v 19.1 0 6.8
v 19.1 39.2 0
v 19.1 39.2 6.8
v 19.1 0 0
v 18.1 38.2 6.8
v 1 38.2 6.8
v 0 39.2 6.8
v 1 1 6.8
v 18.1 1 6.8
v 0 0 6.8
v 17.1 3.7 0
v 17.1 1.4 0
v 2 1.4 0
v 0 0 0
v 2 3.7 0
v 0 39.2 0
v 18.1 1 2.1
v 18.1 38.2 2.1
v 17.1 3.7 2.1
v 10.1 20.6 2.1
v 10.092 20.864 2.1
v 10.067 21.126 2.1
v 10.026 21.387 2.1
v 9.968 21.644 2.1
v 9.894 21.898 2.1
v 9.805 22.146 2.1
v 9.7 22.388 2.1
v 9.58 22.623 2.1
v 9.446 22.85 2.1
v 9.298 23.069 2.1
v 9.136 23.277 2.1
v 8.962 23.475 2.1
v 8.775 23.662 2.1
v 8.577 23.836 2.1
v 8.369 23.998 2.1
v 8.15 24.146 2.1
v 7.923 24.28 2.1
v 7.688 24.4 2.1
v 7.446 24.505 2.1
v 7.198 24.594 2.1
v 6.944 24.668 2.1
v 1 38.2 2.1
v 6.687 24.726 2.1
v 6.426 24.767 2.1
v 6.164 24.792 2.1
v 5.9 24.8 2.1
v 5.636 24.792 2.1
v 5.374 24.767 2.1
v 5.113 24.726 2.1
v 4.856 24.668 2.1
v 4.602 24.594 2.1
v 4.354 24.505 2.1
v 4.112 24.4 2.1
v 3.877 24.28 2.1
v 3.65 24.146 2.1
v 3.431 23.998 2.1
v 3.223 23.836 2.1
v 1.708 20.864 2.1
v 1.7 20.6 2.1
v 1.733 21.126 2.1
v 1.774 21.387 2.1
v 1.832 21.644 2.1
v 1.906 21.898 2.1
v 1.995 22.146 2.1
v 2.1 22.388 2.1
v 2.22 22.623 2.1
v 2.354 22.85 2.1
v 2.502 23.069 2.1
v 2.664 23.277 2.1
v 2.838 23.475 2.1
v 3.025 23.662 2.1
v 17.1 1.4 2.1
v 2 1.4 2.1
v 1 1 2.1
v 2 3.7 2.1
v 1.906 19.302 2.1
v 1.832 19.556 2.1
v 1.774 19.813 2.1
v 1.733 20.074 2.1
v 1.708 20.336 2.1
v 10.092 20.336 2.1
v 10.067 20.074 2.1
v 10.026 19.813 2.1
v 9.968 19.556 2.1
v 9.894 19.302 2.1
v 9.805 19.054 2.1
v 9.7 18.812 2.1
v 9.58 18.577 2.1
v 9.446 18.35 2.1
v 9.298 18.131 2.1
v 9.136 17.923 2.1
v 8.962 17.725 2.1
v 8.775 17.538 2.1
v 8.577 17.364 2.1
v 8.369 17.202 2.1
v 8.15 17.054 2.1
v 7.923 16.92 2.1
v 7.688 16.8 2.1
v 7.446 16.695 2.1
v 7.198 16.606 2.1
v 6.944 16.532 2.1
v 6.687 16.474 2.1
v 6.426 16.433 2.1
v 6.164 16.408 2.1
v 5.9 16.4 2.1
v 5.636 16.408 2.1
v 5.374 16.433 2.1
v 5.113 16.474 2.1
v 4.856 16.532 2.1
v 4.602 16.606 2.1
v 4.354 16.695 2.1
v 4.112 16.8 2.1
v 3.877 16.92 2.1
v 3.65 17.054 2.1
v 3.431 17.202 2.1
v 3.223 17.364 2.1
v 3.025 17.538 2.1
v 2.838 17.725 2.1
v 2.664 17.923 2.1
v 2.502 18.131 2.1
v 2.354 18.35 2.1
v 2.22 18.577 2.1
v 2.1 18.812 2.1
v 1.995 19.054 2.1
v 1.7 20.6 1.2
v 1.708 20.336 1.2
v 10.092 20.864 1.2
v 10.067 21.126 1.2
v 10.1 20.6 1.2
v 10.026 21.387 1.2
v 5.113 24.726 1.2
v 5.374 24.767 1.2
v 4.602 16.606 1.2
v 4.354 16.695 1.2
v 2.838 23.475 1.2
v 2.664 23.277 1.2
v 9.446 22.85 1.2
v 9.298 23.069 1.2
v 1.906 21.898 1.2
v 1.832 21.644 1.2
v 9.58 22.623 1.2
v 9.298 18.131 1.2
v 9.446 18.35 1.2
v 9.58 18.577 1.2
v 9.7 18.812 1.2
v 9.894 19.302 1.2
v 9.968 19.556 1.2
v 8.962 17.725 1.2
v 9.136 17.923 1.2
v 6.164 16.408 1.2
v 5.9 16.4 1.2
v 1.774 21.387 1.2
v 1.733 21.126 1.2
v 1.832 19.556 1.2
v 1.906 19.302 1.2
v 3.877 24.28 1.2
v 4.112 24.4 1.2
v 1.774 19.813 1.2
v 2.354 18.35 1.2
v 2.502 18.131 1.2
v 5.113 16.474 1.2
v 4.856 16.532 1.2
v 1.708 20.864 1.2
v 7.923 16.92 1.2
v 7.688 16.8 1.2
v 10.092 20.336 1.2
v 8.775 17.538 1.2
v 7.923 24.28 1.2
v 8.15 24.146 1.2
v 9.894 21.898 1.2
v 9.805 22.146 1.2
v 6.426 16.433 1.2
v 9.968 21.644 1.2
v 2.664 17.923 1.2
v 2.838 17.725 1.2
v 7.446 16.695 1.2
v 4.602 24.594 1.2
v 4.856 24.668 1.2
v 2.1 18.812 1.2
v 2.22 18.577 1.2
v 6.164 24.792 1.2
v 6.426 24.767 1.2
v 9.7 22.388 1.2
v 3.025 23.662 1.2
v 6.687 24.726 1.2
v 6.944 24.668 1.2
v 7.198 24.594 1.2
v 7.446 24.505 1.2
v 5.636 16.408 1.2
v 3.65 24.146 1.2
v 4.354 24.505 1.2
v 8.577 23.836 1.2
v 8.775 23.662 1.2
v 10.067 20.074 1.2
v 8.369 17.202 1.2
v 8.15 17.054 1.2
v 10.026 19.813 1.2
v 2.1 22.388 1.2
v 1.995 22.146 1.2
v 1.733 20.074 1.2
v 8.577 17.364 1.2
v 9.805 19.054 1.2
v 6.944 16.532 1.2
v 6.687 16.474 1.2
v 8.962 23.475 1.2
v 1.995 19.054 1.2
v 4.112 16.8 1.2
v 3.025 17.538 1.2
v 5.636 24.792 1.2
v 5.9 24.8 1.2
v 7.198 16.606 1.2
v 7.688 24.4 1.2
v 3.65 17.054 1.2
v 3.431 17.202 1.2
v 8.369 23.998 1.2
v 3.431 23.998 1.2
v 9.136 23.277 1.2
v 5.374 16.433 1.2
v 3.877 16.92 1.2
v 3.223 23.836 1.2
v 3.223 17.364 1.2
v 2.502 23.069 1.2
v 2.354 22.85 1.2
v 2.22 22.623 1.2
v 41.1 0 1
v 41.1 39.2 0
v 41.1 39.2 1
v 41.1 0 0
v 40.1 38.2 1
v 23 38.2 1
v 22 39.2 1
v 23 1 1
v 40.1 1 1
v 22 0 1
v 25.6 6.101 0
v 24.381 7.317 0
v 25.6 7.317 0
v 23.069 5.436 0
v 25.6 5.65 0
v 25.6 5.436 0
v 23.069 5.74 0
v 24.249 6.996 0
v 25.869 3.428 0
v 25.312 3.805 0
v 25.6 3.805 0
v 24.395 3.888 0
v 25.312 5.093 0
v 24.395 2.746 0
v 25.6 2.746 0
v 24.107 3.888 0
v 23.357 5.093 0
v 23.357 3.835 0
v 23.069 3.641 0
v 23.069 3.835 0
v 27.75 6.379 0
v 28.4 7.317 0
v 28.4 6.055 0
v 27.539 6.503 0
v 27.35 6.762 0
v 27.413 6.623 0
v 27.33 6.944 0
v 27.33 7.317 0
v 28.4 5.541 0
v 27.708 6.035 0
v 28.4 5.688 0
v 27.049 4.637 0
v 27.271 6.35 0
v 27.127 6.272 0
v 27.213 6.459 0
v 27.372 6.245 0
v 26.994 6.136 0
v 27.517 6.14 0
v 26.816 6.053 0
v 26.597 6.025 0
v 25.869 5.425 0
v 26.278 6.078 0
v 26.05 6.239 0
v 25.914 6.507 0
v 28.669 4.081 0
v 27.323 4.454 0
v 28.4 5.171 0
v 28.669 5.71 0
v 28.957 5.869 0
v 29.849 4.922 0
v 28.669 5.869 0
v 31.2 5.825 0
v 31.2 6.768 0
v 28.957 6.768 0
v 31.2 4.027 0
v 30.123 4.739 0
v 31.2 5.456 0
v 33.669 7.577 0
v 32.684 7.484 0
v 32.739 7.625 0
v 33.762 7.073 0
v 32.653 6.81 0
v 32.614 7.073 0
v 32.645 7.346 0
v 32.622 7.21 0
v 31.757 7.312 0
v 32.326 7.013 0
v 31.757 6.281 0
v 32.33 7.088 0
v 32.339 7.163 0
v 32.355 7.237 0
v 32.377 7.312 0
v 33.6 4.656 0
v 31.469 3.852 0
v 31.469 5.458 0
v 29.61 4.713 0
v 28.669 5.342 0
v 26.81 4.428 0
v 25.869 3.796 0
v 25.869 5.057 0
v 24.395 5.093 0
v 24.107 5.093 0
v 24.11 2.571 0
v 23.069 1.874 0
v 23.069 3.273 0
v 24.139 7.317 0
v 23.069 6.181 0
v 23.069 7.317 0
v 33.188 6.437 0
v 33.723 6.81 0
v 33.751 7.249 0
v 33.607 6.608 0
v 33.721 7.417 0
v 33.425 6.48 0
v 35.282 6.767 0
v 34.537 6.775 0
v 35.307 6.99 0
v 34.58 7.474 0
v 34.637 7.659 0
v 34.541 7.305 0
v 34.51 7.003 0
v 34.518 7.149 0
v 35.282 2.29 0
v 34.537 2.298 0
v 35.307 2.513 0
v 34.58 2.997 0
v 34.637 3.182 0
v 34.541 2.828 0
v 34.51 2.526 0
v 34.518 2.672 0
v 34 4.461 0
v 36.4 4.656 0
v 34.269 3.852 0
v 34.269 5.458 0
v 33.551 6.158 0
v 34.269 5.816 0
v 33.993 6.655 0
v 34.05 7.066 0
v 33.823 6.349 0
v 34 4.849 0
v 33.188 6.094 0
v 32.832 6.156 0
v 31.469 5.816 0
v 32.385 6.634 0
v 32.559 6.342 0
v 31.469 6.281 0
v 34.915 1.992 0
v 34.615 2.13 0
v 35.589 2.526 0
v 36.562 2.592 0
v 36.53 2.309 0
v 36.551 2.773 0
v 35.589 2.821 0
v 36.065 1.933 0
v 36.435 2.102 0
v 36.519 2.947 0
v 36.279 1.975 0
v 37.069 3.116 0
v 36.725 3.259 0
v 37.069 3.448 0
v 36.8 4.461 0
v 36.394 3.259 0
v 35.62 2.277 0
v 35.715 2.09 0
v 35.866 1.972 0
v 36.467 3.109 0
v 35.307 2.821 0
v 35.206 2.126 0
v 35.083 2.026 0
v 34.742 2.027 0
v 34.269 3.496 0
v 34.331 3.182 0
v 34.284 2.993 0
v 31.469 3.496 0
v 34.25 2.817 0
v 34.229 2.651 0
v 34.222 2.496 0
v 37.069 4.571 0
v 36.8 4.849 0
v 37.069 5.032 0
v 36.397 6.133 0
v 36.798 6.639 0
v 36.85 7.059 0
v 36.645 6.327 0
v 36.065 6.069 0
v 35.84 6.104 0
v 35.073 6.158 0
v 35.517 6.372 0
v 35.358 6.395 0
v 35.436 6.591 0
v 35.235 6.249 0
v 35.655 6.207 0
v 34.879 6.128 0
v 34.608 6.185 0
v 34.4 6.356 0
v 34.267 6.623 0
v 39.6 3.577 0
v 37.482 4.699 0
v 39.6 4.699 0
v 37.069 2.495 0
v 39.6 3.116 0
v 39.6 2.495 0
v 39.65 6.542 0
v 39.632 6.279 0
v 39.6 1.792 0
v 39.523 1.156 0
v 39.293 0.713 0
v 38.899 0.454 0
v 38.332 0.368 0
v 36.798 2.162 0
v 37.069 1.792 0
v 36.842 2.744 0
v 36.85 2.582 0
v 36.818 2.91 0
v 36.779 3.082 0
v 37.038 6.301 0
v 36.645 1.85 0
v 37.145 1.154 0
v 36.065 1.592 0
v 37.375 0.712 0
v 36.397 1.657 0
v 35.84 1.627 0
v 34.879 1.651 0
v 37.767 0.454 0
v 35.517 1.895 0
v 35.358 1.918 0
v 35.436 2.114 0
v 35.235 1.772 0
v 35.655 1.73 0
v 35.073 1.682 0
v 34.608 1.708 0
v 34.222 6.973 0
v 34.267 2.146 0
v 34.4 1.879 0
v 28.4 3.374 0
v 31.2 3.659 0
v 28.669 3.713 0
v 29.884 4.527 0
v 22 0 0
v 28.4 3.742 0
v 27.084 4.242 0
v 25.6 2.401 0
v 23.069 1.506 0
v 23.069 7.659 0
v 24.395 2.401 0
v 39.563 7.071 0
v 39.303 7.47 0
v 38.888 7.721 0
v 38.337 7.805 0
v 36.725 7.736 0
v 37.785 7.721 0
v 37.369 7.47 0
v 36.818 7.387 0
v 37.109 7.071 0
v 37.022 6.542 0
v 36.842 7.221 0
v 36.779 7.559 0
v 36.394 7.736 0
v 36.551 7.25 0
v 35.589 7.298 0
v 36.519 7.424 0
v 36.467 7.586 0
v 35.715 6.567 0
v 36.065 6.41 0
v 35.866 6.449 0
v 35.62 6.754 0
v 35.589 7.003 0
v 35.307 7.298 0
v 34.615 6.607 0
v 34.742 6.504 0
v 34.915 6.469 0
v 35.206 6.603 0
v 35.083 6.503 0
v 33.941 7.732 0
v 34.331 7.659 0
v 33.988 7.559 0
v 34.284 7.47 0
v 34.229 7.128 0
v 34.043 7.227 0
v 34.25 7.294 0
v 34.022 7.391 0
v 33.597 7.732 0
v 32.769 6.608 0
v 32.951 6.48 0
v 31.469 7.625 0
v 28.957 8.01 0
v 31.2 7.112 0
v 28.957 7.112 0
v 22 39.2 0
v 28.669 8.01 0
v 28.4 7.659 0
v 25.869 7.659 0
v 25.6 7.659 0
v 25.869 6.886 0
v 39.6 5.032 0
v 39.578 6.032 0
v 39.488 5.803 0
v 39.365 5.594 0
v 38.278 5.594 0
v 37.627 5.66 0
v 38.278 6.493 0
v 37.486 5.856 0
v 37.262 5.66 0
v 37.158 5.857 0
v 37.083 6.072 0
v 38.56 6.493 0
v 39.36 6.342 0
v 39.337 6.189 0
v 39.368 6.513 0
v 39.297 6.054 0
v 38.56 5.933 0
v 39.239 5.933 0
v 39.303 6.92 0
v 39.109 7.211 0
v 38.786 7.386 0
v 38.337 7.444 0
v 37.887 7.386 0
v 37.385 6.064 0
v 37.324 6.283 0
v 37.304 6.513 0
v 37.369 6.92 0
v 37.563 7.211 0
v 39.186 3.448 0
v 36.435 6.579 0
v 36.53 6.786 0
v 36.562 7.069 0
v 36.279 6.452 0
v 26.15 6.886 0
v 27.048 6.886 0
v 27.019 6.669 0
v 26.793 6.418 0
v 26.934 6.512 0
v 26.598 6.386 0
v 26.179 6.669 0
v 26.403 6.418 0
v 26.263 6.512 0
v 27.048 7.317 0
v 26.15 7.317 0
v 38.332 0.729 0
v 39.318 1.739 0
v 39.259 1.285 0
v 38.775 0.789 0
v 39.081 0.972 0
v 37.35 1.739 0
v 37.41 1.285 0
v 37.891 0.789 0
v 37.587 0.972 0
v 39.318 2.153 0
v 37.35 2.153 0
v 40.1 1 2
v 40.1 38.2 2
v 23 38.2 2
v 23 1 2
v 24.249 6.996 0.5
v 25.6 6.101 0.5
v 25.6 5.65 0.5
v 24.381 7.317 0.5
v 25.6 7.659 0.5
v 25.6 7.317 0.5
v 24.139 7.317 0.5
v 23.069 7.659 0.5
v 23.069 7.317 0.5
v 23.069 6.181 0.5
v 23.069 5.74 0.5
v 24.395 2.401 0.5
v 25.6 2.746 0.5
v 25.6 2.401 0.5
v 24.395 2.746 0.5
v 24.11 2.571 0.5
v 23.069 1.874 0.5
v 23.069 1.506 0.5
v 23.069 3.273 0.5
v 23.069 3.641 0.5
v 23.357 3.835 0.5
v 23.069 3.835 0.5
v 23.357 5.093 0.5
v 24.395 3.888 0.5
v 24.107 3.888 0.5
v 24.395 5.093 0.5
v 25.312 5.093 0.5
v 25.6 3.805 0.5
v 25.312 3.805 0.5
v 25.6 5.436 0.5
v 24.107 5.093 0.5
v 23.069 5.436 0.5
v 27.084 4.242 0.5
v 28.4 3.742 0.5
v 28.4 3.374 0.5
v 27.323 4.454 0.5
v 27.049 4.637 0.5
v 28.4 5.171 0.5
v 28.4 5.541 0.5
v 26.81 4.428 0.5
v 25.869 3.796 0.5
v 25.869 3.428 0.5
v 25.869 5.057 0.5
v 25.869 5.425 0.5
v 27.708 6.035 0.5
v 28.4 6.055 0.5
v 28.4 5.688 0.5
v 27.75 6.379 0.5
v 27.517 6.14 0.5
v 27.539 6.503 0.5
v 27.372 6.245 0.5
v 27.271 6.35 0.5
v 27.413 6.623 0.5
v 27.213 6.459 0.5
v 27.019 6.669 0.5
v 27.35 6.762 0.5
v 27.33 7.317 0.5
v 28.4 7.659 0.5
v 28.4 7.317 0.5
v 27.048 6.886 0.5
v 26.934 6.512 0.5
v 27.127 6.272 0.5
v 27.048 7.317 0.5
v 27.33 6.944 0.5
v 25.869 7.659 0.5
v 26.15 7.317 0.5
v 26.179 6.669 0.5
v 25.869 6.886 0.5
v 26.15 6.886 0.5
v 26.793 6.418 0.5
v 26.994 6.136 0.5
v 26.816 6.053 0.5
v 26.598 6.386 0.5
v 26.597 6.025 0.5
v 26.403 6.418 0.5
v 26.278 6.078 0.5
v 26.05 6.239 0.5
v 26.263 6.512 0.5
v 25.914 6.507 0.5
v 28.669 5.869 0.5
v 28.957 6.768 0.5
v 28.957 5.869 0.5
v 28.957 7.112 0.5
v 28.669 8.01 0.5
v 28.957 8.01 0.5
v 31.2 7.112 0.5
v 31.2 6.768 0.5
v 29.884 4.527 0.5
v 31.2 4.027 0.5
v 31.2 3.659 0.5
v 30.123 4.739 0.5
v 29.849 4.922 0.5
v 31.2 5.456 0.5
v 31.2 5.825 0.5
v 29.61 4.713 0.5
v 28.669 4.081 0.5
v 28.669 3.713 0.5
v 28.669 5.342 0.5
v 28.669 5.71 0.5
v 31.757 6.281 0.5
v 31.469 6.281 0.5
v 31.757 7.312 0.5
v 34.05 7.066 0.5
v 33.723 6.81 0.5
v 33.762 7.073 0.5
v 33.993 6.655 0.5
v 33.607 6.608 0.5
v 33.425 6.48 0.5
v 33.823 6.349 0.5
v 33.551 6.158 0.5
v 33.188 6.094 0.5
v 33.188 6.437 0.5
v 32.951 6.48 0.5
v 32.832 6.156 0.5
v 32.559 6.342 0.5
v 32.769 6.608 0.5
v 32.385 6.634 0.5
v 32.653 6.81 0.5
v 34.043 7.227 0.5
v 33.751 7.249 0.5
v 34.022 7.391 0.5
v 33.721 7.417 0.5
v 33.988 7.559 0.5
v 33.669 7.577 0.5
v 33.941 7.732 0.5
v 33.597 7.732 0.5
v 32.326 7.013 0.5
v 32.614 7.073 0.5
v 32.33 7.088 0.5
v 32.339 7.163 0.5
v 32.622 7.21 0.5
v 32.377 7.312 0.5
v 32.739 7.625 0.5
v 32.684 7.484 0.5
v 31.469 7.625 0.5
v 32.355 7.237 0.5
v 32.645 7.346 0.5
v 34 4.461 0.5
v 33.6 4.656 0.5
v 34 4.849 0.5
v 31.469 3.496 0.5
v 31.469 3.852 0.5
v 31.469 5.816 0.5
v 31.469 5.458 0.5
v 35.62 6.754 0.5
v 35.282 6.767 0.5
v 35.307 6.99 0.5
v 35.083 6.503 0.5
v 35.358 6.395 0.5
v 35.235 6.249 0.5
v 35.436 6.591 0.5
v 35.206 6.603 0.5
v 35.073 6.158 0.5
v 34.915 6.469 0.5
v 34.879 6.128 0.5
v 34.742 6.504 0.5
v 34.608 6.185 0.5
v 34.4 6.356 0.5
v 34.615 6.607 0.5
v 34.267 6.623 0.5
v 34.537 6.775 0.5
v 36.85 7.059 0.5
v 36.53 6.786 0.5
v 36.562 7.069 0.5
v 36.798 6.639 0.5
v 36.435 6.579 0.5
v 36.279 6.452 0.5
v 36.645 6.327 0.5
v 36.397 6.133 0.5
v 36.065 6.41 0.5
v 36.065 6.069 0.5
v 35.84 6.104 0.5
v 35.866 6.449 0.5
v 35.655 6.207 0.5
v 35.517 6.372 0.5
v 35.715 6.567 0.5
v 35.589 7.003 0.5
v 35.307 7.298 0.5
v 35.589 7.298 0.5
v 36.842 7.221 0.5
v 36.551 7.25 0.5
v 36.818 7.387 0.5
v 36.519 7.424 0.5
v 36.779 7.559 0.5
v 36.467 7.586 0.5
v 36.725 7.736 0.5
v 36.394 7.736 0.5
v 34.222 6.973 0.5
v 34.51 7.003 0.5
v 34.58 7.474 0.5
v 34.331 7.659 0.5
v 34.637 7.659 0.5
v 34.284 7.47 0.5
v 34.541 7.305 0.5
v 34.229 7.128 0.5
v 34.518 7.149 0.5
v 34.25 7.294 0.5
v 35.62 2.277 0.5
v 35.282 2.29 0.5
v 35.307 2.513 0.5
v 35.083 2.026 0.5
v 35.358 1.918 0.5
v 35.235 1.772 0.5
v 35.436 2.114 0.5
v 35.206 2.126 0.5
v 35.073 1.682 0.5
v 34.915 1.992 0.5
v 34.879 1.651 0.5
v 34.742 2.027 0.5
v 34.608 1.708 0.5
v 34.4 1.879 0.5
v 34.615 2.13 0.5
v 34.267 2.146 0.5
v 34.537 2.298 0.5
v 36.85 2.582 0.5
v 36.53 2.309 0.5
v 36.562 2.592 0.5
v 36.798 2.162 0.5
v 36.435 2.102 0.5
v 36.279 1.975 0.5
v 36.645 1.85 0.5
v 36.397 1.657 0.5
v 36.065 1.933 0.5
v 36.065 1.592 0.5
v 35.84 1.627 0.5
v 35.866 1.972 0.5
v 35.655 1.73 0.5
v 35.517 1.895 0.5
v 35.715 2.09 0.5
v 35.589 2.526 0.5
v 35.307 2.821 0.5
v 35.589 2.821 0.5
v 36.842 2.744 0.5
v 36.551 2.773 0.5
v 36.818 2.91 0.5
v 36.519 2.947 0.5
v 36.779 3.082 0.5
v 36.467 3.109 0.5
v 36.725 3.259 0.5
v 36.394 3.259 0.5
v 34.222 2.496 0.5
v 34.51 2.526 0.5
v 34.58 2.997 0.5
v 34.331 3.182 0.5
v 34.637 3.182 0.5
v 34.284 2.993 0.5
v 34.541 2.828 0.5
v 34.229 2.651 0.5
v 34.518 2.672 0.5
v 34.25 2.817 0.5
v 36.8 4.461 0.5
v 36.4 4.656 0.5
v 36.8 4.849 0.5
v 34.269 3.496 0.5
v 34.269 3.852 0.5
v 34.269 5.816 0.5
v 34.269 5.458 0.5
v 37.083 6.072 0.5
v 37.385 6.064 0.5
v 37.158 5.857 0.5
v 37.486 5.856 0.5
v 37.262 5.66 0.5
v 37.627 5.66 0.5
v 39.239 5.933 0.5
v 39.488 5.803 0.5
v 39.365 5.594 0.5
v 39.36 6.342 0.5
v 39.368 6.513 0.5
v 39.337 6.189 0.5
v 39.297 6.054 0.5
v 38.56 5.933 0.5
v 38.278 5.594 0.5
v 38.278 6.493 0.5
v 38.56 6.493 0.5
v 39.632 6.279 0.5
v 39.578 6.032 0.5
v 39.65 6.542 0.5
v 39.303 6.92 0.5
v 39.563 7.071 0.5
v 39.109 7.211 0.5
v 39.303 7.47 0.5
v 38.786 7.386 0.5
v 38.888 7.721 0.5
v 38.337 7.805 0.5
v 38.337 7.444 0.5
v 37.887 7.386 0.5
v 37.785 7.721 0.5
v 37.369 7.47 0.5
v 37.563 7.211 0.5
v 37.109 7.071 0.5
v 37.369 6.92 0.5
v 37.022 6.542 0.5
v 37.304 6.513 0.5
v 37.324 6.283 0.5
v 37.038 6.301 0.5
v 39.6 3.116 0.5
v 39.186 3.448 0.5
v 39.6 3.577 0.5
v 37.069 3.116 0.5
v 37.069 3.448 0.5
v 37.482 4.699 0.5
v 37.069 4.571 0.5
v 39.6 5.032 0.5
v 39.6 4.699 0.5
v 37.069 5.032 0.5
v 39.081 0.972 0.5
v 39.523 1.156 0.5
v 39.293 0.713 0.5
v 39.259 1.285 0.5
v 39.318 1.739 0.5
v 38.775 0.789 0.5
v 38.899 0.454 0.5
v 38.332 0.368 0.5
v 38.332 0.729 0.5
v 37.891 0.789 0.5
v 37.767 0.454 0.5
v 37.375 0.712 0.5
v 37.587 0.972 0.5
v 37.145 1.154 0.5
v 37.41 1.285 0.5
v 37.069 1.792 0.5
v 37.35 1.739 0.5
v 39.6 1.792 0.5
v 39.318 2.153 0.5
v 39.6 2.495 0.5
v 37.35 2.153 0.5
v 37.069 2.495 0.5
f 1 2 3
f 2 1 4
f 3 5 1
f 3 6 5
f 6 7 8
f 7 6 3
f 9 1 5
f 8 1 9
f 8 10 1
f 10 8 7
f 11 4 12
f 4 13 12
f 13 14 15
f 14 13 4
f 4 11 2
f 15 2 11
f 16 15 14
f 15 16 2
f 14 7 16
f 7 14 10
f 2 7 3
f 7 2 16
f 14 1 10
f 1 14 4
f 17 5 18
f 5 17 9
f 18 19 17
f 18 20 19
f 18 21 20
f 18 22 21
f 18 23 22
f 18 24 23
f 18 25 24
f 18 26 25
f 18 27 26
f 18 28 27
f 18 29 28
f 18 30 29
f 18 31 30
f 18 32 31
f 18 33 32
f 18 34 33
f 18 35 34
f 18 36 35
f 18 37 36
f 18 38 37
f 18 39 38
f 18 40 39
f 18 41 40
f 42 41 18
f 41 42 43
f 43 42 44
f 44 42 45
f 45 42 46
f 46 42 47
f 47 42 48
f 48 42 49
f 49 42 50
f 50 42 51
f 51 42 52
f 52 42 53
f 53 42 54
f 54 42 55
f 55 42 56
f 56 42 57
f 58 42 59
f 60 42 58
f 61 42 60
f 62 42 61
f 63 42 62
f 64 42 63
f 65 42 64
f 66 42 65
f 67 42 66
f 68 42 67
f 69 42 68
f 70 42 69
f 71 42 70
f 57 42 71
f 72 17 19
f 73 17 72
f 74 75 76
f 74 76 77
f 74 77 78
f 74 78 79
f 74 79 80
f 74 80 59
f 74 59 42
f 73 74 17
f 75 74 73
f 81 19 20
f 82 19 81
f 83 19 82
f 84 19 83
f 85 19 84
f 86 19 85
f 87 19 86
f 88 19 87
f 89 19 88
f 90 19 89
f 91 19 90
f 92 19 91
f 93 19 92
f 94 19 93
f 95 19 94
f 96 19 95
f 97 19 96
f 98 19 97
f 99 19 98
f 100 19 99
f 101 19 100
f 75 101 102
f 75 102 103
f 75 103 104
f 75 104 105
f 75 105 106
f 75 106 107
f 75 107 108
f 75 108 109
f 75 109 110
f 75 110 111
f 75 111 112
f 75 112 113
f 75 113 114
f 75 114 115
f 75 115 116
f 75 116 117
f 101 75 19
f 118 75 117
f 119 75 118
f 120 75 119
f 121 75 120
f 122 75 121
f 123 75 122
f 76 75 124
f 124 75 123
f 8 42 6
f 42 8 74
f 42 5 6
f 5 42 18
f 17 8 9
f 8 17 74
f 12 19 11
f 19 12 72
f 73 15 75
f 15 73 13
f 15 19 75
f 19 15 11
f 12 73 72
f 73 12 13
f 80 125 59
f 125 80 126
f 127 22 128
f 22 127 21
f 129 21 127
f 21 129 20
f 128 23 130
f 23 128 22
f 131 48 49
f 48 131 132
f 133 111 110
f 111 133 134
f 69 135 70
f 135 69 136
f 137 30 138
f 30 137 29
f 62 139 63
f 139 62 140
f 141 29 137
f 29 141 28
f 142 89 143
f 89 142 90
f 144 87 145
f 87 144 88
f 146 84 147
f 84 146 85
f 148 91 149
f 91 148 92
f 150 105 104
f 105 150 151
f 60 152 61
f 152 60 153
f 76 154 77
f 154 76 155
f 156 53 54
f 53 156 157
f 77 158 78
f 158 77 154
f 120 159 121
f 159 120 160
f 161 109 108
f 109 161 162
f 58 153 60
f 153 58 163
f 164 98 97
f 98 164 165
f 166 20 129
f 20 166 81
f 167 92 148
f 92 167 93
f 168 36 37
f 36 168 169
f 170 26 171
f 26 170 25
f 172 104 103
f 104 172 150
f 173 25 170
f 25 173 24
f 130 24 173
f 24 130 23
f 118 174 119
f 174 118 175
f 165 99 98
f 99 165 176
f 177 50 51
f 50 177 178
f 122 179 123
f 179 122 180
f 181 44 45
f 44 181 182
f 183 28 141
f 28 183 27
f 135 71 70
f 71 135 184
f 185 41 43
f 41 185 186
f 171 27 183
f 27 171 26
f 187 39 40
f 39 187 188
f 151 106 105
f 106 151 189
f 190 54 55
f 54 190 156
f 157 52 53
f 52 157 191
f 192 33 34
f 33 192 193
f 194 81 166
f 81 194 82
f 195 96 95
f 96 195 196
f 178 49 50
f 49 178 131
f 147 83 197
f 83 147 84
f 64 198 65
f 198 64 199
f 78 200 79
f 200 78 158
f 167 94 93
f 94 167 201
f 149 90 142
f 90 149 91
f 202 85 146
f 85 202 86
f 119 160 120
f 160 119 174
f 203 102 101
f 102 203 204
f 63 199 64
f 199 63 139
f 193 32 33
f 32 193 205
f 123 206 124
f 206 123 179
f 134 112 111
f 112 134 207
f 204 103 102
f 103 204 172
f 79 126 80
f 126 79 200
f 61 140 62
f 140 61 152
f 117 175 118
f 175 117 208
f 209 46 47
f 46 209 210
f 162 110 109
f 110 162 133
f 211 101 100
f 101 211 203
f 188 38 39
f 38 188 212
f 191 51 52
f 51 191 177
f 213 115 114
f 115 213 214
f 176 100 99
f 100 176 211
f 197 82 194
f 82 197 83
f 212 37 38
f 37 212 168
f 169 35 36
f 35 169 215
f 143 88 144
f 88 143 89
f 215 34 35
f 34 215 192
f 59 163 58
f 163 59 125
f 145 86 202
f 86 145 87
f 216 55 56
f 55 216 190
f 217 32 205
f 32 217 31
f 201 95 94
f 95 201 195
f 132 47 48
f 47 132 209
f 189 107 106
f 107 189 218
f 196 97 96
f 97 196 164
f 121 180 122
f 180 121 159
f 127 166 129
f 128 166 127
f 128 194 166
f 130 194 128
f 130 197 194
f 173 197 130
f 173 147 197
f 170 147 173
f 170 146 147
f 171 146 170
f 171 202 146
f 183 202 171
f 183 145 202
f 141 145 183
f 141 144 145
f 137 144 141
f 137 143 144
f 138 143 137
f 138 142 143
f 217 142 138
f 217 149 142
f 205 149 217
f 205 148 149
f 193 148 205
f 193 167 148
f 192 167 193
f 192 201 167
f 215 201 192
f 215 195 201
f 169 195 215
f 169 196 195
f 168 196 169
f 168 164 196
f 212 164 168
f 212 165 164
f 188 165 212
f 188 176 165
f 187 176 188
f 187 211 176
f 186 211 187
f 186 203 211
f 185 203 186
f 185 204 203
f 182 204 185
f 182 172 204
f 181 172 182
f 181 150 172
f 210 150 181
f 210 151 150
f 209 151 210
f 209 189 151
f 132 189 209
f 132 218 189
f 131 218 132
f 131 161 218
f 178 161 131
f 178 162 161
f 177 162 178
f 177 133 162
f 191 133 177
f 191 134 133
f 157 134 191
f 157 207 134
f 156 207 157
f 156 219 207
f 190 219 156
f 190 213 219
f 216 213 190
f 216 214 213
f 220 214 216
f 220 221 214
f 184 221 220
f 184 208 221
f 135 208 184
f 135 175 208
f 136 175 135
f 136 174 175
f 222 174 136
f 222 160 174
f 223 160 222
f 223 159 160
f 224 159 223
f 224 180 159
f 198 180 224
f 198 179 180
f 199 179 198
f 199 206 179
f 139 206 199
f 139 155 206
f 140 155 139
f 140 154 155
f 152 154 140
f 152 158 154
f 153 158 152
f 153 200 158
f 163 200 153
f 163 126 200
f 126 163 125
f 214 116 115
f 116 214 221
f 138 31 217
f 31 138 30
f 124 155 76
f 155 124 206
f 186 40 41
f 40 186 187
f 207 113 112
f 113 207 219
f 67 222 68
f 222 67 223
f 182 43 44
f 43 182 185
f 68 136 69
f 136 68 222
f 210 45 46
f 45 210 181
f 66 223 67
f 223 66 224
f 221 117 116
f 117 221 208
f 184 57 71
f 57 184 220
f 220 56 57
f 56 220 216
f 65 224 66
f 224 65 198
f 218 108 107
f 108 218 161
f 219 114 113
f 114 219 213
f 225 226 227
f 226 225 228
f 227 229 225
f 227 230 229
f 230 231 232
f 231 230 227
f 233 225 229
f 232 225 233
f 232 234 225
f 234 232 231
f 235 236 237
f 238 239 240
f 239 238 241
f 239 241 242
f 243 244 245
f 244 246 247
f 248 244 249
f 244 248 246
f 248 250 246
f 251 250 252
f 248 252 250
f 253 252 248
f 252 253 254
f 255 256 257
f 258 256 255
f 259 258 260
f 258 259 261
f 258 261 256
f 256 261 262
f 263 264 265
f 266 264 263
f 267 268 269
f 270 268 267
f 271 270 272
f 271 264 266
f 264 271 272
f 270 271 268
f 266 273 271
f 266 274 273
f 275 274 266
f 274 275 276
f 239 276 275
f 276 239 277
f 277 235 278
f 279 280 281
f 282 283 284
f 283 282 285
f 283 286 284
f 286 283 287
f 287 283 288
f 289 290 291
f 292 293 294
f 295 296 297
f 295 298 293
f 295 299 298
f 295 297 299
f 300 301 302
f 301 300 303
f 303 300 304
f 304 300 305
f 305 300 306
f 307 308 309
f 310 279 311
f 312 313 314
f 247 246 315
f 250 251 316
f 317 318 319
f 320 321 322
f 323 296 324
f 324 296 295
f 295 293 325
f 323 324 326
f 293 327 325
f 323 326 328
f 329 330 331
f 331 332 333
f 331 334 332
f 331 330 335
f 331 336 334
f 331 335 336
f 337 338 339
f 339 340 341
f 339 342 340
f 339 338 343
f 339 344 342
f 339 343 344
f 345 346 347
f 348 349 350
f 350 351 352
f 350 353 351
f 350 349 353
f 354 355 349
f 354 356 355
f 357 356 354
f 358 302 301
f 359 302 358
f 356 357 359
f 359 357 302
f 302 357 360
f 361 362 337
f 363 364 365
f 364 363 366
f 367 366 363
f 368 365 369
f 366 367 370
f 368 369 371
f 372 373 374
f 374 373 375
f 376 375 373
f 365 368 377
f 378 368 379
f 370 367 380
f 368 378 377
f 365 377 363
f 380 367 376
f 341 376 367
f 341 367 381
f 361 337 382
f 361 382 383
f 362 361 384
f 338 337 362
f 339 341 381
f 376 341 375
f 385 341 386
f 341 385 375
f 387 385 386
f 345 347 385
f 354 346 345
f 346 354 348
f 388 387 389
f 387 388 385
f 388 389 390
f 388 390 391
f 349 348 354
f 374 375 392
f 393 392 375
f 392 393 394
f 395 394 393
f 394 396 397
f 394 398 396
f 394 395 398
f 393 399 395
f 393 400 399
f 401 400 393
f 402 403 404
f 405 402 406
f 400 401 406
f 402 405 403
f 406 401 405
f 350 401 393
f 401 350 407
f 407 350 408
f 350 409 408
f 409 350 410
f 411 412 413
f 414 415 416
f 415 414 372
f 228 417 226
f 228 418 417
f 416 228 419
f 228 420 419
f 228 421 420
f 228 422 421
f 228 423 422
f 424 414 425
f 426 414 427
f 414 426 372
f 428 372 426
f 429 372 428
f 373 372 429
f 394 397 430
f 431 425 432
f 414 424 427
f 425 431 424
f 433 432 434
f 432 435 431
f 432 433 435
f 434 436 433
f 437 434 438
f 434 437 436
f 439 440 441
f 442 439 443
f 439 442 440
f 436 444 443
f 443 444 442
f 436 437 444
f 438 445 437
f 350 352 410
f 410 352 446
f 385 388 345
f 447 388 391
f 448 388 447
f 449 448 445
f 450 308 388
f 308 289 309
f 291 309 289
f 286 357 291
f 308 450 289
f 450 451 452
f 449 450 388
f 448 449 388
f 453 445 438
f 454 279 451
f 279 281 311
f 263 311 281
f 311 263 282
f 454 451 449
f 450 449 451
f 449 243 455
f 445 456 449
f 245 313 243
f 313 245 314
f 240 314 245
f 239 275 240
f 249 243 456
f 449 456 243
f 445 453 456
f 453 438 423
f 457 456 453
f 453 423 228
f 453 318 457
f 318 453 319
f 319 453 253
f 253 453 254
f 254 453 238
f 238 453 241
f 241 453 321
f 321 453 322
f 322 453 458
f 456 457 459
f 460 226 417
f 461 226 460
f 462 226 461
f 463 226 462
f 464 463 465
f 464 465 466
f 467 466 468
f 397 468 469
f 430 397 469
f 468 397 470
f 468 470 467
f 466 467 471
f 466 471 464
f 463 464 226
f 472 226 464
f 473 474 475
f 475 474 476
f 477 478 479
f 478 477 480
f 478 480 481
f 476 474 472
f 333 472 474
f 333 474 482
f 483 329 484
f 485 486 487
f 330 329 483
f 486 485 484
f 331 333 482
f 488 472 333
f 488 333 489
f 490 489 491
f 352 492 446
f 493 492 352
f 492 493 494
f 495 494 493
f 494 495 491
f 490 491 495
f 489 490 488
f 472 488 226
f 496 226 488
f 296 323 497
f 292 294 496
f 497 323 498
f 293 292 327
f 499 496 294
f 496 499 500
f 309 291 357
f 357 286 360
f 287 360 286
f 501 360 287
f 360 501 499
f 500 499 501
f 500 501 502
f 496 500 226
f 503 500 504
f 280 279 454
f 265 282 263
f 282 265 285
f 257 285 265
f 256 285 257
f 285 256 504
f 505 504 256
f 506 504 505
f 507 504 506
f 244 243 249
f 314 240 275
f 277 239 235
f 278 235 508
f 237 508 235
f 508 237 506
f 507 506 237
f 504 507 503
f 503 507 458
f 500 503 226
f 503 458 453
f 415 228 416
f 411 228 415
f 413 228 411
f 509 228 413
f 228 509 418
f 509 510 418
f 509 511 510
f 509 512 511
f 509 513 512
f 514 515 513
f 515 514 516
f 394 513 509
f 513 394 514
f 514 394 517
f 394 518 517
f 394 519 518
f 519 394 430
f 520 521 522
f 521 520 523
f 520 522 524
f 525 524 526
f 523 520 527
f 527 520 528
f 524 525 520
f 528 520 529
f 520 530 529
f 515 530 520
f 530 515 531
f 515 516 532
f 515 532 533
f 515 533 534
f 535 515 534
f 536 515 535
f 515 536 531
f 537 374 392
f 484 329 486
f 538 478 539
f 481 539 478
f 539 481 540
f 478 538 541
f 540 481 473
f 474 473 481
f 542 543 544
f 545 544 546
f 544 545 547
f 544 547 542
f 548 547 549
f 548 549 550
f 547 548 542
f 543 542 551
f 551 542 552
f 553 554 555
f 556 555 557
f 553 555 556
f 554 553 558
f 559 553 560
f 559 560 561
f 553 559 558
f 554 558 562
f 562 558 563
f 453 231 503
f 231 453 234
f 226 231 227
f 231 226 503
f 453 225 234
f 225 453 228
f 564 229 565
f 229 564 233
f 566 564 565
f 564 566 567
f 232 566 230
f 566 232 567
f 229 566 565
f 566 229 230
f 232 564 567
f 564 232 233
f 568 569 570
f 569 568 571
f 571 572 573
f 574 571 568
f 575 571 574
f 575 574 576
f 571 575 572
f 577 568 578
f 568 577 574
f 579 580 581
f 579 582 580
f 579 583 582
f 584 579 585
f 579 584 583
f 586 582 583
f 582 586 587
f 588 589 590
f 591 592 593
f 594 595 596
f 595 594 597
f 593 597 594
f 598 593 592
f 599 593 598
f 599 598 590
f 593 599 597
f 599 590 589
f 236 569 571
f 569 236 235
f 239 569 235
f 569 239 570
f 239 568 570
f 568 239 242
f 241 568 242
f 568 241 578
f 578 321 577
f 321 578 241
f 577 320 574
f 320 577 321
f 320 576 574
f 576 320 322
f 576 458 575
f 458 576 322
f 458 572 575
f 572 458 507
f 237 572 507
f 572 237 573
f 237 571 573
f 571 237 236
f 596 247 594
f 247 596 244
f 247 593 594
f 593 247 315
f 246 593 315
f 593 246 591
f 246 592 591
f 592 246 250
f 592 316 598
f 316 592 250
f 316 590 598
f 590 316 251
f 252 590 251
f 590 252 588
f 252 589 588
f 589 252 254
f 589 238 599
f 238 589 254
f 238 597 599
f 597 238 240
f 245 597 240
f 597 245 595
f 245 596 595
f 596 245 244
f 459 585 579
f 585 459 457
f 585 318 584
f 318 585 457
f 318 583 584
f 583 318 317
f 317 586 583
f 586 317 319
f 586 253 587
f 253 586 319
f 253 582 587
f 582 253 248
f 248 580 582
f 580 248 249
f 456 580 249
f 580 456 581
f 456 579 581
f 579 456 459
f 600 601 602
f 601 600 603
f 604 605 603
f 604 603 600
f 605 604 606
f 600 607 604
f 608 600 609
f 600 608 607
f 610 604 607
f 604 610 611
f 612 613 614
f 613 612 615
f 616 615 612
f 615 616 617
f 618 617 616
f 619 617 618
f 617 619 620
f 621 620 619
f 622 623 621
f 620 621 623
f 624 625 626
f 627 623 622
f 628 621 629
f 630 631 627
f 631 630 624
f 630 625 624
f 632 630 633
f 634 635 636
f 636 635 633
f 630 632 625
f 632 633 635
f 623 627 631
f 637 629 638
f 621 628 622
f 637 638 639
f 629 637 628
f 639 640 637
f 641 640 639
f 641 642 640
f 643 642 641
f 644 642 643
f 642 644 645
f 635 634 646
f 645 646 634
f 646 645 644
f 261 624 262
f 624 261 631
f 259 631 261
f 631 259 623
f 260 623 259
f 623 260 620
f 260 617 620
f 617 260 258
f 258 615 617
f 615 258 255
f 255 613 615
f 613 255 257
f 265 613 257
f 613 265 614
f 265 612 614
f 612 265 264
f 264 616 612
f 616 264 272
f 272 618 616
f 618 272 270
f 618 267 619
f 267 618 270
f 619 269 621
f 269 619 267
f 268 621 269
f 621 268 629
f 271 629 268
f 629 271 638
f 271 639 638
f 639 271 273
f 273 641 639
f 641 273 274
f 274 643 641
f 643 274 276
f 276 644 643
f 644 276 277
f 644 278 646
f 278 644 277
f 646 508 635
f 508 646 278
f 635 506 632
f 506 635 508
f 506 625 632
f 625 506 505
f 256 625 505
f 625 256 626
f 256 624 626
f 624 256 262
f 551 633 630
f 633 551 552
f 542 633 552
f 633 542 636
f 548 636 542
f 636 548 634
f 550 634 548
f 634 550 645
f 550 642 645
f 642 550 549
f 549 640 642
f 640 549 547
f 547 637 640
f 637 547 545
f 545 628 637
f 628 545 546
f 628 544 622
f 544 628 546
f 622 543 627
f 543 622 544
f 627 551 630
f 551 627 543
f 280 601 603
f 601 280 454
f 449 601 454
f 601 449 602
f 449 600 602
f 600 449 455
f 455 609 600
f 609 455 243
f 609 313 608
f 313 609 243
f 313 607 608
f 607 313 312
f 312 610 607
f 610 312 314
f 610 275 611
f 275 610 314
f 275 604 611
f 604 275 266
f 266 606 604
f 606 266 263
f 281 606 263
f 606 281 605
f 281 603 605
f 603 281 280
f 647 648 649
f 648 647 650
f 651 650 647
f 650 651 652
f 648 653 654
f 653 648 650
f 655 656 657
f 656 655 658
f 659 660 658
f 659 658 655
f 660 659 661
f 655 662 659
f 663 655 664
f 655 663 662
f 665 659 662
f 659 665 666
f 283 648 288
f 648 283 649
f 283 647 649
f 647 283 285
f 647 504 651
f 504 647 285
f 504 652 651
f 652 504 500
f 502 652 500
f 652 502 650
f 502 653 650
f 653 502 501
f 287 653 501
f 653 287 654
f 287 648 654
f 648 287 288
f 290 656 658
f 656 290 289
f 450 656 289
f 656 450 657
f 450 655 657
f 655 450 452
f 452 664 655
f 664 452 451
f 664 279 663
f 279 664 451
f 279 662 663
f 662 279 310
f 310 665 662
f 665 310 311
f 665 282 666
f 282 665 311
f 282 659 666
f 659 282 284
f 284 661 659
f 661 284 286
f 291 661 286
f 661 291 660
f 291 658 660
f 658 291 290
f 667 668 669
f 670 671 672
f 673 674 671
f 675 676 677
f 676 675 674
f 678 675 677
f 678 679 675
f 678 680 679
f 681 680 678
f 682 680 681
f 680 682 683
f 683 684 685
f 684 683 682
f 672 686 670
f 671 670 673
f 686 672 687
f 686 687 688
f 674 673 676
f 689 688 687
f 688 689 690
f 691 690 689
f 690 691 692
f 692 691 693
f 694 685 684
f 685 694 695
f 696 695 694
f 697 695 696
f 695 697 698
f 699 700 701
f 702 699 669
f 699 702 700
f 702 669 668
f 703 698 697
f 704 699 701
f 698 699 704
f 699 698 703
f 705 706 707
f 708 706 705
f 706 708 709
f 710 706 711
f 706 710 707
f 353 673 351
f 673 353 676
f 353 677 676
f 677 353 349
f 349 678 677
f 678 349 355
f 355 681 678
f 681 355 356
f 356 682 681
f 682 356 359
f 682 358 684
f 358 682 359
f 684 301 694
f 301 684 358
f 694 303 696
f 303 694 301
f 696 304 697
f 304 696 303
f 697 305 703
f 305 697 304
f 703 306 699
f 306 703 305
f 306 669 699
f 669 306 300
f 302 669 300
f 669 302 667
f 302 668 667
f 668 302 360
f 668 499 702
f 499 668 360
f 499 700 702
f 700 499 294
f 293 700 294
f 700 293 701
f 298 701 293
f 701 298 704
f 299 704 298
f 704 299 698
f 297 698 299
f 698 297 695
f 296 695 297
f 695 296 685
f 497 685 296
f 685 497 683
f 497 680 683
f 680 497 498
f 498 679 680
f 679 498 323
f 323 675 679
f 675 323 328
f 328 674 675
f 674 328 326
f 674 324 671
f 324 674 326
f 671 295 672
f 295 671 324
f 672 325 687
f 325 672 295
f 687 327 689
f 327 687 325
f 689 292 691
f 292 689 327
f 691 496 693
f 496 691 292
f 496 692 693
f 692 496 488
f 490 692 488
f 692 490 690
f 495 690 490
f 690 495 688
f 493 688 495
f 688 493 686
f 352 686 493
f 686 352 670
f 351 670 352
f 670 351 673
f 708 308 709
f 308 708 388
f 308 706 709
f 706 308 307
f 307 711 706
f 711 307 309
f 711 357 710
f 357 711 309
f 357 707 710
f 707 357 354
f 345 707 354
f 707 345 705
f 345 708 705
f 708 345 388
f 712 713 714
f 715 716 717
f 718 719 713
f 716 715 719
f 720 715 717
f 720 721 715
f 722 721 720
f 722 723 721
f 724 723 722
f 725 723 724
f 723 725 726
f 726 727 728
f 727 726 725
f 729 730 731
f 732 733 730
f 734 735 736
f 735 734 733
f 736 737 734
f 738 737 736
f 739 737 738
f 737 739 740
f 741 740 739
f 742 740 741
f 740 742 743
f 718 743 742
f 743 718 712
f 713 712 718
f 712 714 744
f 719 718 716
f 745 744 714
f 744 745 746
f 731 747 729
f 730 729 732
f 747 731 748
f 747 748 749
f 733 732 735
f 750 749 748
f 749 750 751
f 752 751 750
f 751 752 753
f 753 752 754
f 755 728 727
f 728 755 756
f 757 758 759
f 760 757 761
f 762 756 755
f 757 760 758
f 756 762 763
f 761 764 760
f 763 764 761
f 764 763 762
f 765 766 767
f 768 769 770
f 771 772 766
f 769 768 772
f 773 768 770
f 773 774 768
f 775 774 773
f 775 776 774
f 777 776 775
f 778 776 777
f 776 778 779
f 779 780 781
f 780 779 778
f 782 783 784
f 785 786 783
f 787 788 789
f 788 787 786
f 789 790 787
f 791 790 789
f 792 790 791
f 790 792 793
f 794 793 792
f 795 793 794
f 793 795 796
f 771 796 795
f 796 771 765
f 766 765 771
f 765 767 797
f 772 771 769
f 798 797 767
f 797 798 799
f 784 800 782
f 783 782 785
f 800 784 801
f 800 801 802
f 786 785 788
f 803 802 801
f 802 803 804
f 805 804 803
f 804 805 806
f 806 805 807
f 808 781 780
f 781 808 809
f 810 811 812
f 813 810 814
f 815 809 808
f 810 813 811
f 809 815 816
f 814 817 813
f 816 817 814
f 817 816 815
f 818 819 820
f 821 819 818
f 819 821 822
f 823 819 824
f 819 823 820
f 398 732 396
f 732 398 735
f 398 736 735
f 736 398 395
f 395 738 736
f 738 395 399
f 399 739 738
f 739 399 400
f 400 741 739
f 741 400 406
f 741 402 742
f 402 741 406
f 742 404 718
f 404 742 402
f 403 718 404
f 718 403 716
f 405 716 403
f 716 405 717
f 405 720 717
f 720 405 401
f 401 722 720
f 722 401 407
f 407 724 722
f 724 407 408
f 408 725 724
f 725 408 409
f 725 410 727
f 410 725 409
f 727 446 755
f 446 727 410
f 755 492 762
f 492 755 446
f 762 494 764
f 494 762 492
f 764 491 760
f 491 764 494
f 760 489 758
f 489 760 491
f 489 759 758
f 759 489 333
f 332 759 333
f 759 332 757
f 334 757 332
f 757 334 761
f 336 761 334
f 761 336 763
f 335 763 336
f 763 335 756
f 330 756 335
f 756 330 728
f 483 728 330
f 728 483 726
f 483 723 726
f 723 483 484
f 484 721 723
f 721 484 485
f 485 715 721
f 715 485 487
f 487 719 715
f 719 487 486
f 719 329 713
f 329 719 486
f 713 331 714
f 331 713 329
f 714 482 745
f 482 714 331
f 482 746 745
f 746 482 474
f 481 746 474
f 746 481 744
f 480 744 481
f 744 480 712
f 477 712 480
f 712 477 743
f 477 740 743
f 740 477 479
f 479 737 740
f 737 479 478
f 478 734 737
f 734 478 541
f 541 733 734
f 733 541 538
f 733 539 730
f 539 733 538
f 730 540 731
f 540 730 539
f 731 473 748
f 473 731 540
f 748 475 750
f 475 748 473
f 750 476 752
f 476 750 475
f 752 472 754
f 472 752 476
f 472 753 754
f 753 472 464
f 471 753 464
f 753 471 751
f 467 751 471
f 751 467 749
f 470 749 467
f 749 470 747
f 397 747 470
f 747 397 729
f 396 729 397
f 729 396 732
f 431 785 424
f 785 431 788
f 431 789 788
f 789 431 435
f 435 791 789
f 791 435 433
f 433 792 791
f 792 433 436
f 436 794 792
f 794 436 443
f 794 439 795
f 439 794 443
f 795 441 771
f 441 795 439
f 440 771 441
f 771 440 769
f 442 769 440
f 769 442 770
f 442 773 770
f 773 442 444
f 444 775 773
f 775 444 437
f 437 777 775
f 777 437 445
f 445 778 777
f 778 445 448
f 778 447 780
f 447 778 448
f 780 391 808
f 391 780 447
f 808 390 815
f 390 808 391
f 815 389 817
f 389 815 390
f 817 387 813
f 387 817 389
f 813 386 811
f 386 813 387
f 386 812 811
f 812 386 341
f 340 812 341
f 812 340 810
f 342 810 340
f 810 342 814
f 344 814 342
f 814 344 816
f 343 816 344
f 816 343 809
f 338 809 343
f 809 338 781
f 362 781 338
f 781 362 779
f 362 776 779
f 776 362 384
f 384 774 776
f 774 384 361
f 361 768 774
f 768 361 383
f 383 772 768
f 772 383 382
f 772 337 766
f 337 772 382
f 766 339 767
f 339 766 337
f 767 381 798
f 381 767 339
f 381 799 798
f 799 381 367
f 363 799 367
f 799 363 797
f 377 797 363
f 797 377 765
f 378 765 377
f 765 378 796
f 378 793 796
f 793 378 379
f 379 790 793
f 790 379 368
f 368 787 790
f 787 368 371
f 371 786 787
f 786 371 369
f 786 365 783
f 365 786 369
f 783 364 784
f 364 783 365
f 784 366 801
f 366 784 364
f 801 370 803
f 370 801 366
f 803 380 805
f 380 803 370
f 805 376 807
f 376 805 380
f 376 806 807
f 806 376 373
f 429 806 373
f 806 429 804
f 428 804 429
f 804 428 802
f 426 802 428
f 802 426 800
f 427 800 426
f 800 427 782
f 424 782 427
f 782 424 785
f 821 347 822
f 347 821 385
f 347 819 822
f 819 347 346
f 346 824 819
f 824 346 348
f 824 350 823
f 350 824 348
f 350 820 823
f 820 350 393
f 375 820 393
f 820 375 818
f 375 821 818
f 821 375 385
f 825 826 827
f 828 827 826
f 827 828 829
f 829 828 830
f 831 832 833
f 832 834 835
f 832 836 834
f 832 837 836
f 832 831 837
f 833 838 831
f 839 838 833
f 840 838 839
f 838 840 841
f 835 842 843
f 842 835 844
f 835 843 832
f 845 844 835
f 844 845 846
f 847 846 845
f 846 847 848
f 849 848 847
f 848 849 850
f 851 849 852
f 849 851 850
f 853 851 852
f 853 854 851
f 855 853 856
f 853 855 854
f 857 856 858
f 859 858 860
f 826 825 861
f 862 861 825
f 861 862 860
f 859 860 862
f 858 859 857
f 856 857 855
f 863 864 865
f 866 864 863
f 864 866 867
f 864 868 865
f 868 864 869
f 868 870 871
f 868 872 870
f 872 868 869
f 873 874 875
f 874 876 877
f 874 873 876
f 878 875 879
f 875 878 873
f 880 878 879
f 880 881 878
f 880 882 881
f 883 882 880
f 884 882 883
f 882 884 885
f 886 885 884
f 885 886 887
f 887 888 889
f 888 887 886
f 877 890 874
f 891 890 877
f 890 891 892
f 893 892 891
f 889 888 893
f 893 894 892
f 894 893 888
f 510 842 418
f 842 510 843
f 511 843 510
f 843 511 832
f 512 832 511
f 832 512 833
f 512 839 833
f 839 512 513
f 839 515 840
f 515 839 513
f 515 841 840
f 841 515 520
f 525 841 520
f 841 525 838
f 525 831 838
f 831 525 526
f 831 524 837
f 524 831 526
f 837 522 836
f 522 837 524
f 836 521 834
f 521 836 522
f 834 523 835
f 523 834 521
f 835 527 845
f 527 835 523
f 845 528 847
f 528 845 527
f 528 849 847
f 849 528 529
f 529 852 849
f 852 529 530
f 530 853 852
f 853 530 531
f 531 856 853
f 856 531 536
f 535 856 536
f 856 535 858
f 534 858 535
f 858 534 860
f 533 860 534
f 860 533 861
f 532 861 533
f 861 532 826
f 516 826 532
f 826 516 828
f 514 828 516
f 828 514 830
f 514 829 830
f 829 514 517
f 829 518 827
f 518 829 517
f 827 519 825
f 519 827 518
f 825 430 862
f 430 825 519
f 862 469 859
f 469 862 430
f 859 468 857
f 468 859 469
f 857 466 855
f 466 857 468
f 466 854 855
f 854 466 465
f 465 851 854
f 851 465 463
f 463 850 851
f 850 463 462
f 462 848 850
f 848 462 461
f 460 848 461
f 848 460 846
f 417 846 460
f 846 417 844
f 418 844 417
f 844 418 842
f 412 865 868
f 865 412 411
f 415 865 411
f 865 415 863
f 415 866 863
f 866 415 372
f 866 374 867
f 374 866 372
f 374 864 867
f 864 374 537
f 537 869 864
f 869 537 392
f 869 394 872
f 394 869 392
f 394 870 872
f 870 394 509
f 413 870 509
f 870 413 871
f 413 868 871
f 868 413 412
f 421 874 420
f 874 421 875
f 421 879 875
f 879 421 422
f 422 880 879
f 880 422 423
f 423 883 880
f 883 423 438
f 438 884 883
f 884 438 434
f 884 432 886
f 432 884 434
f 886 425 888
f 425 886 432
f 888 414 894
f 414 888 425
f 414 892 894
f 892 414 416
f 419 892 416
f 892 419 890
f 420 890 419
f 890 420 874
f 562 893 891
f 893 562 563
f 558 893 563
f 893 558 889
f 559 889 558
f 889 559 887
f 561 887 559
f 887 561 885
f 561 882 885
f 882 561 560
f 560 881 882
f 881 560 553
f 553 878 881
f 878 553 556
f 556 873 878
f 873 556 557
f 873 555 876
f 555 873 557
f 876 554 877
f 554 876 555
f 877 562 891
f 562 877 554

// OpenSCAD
difference() {
  cube([19.1, 39.2, 6.8]);
  translate([1, 1, 2.1]) cube([17.1, 37.2, 10]);
  translate([2, 1.4, -5]) cube([15.1, 2.3, 10]);
  translate([5.9, 20.6, 1.2]) cylinder(10, 4.2, 4.2, $fn = 100);
}

translate([22, 0, 0]) difference() {
  union() {
    cube([19.1, 39.2, 1]);
    translate([1, 1, 0]) cube([17.1, 37.2, 2]);
  }
  translate([9.5, 26, 0.5]) scale(0.1) surface("bluetooth_symbol.png", center = true, invert = true);
  label = ["KEY", "RX ", "TX ", "5V ", "3V3", "GND"];
  for(i = [0:5]) {
    echo([i, label[i]]);
    translate([3.6 + 2.8 * i, 8, 0.5]) rotate([180, 0, 270]) linear_extrude(height = 1) text(label[i], 2.5, "Ubuntu Mono", $fn = 6);
  }
}    
